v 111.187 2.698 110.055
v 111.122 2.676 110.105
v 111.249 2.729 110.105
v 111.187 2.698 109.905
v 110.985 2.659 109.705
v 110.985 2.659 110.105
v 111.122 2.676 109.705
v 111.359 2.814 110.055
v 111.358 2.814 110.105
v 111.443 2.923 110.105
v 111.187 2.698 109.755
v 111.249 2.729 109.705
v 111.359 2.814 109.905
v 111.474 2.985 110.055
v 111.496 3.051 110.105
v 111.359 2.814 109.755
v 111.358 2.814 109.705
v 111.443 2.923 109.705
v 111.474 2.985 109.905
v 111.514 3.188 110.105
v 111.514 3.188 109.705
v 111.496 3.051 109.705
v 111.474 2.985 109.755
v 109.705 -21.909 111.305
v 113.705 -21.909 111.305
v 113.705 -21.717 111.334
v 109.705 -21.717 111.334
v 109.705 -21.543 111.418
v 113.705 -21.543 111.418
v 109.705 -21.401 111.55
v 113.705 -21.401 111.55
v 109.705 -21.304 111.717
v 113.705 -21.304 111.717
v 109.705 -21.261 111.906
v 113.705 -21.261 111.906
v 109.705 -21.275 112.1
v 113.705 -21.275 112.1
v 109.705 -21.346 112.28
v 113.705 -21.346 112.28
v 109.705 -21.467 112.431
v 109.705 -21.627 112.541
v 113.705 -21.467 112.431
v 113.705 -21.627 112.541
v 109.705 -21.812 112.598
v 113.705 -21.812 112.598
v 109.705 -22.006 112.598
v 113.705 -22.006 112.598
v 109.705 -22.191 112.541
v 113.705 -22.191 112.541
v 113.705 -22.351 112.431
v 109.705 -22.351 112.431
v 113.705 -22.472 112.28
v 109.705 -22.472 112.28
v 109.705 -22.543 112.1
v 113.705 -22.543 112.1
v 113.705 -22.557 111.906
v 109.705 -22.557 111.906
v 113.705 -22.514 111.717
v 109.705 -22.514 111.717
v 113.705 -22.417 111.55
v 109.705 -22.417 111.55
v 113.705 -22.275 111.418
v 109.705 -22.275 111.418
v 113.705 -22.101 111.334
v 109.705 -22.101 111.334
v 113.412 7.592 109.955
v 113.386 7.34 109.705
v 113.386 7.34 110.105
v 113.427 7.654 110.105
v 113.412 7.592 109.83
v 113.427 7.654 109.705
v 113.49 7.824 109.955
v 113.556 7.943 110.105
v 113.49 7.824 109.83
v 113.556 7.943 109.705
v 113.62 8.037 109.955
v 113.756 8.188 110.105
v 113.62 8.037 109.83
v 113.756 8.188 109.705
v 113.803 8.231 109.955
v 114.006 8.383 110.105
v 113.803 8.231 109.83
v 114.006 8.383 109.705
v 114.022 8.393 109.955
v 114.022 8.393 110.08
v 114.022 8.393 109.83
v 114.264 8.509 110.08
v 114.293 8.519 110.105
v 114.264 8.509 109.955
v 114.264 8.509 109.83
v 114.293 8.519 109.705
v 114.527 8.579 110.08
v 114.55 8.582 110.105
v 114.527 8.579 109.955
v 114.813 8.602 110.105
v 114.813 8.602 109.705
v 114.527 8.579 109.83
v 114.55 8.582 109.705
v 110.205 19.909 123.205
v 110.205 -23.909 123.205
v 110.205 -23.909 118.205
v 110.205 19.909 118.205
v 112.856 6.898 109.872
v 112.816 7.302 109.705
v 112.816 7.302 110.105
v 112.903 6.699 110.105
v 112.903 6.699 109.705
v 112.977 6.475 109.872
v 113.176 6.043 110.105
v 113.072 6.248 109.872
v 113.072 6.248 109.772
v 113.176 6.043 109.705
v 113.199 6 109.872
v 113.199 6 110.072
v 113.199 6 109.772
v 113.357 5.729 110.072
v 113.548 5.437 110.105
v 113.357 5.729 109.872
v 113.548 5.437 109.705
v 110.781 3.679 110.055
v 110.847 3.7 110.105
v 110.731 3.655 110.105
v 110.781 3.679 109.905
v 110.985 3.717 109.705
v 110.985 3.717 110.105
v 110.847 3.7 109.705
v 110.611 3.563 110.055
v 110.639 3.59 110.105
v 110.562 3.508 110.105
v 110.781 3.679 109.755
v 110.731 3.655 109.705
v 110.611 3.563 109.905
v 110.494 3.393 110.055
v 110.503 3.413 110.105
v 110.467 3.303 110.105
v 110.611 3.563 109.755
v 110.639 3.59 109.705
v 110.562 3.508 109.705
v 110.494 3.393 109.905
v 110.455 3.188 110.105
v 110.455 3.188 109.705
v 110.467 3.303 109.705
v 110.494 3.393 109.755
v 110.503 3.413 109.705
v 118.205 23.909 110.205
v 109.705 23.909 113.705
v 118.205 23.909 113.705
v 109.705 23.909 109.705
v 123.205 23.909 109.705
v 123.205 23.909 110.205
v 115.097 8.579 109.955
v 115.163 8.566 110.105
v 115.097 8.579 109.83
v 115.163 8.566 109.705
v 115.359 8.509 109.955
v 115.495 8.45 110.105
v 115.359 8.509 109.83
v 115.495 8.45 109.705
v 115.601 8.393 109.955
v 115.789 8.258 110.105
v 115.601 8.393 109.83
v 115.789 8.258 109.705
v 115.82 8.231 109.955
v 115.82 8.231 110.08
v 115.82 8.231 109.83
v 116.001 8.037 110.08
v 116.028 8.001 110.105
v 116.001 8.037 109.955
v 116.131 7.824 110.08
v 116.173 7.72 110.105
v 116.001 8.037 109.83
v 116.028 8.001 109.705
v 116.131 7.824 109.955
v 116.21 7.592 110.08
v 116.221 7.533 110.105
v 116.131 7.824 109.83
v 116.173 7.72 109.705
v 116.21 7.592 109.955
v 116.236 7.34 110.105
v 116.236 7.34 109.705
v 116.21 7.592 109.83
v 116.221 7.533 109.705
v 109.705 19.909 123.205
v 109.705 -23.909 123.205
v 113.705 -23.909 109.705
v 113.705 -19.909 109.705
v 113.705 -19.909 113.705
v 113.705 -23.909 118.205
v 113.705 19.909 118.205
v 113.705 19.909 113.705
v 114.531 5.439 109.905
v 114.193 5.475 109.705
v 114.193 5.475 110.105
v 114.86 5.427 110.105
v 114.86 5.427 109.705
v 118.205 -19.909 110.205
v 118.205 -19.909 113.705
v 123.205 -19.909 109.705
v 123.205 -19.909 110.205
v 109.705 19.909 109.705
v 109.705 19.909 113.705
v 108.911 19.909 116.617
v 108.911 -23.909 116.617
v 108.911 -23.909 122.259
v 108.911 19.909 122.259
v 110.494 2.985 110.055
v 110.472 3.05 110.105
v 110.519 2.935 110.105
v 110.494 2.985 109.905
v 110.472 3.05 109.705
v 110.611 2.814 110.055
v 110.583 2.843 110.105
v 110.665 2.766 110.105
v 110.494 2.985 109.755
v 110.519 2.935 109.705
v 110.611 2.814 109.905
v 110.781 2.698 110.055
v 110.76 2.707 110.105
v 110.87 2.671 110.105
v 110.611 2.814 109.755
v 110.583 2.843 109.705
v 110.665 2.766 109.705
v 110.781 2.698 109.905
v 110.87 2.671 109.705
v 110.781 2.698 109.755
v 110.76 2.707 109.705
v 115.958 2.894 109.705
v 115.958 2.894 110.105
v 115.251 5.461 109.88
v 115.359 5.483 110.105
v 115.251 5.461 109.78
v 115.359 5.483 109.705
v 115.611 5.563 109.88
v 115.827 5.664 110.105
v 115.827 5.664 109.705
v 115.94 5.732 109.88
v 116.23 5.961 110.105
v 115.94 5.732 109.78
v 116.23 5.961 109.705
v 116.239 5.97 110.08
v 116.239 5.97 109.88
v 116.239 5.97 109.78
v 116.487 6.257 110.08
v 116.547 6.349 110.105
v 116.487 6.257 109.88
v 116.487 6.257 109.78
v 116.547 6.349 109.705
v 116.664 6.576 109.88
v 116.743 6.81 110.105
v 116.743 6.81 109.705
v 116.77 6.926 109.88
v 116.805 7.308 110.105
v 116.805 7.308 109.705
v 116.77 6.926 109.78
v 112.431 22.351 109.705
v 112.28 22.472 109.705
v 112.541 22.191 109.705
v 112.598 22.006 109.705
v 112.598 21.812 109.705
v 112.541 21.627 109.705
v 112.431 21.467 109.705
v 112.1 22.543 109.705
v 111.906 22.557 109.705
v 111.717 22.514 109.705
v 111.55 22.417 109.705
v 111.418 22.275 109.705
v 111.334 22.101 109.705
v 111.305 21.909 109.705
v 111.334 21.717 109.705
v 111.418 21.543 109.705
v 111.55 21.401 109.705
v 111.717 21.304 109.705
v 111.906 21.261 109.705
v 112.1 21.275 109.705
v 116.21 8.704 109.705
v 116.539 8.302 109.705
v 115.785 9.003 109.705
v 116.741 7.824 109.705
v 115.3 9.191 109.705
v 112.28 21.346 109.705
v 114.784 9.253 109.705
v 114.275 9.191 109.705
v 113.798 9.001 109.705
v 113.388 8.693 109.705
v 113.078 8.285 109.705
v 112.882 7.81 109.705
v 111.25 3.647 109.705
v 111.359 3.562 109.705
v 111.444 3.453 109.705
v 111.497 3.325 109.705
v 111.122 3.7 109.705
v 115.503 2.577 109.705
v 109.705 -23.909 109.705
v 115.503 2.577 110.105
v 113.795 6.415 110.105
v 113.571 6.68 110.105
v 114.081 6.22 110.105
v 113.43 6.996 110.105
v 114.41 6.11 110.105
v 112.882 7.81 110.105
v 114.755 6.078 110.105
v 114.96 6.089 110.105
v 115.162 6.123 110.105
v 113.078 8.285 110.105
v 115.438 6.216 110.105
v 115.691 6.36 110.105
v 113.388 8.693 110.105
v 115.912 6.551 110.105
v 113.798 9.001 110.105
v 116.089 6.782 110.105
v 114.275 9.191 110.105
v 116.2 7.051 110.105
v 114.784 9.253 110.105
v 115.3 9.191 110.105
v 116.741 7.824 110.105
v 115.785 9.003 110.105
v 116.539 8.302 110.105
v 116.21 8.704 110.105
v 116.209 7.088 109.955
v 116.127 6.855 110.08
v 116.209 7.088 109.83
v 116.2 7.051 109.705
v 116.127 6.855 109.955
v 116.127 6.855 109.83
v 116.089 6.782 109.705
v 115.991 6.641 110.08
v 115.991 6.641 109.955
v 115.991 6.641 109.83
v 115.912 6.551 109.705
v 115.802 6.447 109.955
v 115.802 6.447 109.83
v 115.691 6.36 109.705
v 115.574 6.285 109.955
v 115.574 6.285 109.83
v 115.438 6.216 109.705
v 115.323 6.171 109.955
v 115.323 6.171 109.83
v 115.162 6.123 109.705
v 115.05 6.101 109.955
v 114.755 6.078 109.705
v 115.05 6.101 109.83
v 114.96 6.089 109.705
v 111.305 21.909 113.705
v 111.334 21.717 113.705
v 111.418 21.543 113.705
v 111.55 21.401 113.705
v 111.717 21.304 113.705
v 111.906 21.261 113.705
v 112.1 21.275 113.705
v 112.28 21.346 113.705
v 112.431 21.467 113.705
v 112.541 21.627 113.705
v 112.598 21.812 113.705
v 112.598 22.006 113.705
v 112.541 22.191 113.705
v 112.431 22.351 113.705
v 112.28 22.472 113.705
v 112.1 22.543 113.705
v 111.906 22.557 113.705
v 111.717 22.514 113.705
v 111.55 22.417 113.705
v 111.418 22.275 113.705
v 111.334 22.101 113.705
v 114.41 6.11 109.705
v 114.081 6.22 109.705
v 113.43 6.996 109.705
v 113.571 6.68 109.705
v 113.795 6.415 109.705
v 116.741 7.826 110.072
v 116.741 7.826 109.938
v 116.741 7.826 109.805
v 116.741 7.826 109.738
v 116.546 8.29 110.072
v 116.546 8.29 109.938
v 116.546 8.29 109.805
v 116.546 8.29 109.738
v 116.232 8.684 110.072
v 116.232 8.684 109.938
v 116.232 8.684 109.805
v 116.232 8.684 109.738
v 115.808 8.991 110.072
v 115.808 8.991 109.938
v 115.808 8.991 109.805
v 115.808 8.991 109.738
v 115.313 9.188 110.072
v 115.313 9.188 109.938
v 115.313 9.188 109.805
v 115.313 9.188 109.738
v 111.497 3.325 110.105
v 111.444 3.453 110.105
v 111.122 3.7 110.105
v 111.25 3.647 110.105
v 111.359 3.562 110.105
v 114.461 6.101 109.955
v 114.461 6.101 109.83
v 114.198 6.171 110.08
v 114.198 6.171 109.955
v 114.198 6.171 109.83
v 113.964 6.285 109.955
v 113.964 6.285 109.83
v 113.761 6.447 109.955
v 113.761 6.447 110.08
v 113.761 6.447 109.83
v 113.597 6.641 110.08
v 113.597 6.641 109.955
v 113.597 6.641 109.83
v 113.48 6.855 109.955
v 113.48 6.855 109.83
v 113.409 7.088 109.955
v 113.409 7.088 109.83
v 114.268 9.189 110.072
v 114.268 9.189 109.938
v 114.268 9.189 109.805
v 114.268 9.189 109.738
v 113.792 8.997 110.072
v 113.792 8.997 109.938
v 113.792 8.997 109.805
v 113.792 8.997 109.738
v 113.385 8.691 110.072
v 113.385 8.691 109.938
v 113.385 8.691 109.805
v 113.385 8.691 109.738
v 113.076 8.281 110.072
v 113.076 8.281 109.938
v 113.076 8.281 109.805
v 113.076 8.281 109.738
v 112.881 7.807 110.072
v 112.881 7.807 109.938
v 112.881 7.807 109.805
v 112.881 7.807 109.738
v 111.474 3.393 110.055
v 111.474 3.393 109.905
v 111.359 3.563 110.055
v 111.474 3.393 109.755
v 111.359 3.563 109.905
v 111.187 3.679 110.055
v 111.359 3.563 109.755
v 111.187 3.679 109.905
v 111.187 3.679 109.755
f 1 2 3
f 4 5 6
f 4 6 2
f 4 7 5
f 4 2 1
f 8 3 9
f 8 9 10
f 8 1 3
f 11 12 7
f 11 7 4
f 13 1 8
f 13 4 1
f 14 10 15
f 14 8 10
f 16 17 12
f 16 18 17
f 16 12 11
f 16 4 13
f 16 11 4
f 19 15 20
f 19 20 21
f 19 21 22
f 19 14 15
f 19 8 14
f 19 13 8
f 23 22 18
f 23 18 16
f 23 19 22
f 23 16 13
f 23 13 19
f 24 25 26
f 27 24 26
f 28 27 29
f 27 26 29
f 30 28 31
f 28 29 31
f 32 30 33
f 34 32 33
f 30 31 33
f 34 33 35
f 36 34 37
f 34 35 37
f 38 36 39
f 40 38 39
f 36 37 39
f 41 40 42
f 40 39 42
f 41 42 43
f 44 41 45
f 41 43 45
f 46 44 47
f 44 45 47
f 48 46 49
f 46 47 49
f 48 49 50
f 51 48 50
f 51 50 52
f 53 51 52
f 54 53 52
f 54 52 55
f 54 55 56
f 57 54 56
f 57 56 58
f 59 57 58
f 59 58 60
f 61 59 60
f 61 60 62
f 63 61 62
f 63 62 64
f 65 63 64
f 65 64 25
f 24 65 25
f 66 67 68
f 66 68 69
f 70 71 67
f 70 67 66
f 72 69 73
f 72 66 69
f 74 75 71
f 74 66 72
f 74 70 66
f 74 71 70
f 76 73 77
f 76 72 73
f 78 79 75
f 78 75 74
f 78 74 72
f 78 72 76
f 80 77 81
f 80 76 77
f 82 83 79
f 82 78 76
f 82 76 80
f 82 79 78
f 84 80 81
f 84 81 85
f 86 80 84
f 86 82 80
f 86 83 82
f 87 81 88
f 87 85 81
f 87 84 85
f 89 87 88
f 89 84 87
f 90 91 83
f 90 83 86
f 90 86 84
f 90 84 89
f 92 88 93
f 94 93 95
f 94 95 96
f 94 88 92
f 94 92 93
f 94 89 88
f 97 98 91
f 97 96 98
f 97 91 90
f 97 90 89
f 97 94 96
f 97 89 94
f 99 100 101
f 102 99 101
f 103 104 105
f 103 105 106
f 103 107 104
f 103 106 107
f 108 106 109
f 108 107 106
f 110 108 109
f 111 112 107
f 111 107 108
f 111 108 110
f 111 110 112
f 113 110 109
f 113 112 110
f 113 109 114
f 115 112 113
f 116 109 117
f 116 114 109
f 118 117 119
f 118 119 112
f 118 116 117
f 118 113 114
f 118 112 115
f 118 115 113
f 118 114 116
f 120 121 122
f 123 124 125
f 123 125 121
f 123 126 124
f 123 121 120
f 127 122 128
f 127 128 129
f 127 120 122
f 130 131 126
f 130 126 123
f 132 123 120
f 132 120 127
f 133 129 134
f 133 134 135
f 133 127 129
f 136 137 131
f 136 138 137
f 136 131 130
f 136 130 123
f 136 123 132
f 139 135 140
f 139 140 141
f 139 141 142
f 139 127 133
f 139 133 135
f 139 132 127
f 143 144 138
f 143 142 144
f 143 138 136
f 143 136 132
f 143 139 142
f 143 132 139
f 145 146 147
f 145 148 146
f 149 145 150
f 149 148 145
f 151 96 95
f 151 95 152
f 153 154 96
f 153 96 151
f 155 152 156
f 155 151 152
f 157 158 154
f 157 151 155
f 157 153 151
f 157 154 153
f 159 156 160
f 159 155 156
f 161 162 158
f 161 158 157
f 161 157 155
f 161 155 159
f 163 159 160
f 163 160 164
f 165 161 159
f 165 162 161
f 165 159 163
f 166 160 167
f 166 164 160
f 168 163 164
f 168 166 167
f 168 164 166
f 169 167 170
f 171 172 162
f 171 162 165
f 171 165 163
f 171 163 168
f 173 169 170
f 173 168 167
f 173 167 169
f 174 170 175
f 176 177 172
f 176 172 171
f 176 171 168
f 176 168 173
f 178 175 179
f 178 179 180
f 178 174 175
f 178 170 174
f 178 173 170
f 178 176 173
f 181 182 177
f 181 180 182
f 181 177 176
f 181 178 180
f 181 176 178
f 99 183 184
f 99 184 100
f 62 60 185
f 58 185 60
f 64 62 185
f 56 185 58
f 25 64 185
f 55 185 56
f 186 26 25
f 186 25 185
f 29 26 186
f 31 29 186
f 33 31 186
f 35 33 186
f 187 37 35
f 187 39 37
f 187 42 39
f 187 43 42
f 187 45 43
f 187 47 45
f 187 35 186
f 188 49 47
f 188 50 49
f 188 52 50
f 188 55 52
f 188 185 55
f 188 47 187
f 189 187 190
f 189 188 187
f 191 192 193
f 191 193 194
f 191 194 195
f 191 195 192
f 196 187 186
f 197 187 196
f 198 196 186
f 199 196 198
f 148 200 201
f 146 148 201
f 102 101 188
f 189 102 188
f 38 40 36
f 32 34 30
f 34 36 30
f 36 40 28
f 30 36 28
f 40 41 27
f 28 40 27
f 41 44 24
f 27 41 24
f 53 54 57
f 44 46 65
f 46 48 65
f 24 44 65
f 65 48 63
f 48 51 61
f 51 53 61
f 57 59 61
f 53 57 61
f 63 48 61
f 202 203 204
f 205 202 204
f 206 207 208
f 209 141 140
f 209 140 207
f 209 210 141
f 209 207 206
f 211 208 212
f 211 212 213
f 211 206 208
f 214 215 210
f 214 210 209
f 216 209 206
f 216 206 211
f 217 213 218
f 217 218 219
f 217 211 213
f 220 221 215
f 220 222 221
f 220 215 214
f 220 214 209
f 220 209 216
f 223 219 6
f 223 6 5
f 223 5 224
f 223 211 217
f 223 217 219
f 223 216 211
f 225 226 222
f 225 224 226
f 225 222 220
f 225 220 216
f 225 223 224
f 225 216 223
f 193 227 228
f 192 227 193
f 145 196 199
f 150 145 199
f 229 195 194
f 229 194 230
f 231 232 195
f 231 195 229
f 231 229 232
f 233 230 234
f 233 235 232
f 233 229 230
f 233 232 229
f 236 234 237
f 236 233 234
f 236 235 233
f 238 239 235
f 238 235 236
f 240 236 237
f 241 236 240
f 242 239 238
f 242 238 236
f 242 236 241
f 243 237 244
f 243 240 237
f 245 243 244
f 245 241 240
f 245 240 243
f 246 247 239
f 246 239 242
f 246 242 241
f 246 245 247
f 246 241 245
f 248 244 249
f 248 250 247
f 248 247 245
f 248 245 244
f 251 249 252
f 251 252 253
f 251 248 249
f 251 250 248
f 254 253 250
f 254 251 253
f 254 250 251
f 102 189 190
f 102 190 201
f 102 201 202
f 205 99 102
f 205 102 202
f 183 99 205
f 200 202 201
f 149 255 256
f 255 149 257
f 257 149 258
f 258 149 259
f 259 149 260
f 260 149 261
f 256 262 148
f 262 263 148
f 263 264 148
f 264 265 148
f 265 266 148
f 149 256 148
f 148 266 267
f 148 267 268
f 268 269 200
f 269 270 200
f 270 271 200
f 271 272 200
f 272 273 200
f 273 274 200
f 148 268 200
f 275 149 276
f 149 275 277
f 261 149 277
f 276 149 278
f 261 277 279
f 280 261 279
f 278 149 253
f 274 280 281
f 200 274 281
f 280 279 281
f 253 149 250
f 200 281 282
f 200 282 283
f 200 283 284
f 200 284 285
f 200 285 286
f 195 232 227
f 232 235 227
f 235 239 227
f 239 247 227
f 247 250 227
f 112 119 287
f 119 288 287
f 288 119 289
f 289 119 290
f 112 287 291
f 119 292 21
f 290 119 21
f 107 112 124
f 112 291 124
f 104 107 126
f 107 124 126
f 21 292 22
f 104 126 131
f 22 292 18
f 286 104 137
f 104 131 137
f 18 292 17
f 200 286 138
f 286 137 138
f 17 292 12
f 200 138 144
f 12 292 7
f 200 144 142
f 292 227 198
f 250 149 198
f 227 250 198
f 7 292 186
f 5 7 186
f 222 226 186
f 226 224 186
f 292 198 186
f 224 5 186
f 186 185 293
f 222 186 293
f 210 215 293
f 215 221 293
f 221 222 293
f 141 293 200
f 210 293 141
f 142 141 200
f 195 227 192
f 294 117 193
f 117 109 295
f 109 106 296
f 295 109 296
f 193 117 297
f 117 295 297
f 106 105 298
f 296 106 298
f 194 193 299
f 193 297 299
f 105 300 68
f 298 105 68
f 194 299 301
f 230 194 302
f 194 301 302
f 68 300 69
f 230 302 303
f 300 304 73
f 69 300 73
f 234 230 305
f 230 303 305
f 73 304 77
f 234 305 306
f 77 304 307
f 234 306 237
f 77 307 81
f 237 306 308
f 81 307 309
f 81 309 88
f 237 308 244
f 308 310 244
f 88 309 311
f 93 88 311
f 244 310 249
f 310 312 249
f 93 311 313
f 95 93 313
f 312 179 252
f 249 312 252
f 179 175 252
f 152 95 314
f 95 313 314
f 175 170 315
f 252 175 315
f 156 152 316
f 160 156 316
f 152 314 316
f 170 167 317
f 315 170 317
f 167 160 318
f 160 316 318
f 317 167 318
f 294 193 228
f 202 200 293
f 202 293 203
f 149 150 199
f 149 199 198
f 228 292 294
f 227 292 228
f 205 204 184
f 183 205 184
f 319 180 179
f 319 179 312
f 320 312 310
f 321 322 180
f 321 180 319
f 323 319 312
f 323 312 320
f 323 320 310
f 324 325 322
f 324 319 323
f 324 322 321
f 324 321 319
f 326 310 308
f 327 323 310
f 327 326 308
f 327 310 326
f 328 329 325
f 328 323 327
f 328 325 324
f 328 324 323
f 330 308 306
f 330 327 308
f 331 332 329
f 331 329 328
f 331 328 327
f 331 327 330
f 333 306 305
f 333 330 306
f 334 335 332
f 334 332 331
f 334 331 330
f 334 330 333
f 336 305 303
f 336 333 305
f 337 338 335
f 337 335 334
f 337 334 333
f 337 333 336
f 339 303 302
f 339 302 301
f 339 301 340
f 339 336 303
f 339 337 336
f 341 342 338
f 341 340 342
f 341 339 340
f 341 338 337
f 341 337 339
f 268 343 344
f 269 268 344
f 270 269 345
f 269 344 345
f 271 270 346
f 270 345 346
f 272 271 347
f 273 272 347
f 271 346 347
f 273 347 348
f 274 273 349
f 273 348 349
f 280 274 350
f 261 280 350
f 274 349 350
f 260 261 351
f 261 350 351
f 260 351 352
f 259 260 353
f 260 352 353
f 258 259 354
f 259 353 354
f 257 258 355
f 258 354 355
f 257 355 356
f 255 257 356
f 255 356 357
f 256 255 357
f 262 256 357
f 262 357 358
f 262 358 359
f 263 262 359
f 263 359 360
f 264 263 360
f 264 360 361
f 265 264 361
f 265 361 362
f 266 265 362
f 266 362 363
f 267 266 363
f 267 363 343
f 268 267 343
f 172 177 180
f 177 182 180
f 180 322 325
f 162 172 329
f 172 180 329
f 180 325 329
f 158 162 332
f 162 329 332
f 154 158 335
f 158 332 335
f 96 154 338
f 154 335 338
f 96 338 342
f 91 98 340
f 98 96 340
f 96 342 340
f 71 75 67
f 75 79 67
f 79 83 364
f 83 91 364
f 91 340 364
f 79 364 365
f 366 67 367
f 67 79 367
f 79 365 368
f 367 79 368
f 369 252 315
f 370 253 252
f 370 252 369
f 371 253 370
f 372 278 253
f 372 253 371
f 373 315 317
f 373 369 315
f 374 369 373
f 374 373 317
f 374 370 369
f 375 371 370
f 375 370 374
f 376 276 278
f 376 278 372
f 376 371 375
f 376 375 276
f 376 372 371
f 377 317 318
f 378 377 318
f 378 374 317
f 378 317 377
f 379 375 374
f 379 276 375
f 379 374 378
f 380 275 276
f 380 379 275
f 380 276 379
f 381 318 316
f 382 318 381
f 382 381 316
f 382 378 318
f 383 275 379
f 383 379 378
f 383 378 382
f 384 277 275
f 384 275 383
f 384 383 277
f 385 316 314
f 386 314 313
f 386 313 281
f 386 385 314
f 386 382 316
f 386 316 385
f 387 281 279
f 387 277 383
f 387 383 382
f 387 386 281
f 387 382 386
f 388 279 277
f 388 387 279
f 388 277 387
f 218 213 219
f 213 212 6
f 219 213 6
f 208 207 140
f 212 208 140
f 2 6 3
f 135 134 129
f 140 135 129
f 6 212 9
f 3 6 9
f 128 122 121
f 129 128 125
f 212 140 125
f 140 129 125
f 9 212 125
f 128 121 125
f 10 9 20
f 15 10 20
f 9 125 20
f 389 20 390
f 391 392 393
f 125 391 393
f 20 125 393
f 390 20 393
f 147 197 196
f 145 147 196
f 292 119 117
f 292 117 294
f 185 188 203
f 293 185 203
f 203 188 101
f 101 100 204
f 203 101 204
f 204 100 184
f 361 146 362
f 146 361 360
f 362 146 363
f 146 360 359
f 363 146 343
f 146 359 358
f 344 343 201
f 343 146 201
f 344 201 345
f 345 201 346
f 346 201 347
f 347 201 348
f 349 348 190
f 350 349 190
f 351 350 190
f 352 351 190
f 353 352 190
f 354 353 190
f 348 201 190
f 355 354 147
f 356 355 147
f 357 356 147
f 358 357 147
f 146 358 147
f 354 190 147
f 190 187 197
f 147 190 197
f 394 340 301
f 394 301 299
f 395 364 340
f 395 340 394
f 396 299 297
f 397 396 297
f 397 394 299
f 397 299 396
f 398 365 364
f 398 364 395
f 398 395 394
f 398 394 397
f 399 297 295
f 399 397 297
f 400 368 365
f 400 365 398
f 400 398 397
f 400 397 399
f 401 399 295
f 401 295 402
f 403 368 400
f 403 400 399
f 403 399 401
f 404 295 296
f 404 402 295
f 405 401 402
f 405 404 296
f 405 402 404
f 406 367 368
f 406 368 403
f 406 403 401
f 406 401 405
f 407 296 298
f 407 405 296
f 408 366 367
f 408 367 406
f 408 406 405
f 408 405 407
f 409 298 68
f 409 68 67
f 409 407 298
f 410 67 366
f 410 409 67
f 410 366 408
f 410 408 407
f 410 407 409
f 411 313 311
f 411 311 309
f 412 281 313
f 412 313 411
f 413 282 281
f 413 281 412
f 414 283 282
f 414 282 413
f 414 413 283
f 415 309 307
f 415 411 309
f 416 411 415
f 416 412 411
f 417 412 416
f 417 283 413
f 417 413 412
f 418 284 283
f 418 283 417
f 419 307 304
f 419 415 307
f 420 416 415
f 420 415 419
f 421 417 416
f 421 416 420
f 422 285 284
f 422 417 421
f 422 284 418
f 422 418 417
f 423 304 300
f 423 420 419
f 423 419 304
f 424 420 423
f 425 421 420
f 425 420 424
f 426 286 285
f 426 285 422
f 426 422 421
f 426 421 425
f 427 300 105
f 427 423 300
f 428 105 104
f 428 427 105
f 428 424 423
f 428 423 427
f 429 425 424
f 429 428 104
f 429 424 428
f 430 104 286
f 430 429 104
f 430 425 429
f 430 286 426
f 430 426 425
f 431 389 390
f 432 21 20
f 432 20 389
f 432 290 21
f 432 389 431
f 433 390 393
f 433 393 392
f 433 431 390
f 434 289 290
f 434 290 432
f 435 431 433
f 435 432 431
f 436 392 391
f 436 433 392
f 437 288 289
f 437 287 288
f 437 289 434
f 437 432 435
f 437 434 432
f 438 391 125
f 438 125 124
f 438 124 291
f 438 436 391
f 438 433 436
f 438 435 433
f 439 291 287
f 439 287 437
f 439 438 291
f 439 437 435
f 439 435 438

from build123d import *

# Parameters (mm, degrees)
STOCK_GOUX_START         = -23.909074226
STOCK_GOUX_LIKED_1_DEPTH = 47.818148452
SKETCH2_W                = 9.499999796
SKETCH2_H                = 4
CUT_EXTRUDE1_DEPTH       = 126.862368241
SKETCH4_R                = 0.64999997
CUT_EXTRUDE2_DEPTH       = 126.862368241
CIRPATTERN1_COUNT        = 2
CUT_EXTRUDE3_DEPTH       = 0.4
BOSS_EXTRUDE1_DEPTH      = 43.818148451


# Read off the part's stored shape, not the designer's step: Stock-Goux Liked-1
with BuildPart() as part:
    # Stock-Goux Liked-1 outline → Stock-Goux Liked-1 (new body)
    with BuildSketch(Plane(origin=(0, 0, 0), x_dir=(1, 0, 0), z_dir=(0, 1, 0)).offset(STOCK_GOUX_START)):
        Polygon((118.20487789, -113.704878), (118.20487789, -110.204877888), (123.204877796, -110.204877888), (123.204877796, -109.704877872), (109.704877872, -109.704877872), (109.704877872, -123.204877796), (110.204877888, -123.204877796), (110.204877888, -118.20487789), (113.704878, -118.20487789), (113.704878, -113.704878), align=None)
    extrude(amount=STOCK_GOUX_LIKED_1_DEPTH)

    # Sketch2 → Cut-Extrude1 (cut, through all)
    with BuildSketch(Plane.XY.offset(113.704878)):
        with Locations((118.454877898, -21.909074226)):
            Rectangle(SKETCH2_W, SKETCH2_H)
    cut_extrude1 = extrude(amount=-CUT_EXTRUDE1_DEPTH, mode=Mode.SUBTRACT)

    # Sketch4 → Cut-Extrude2 (cut, through all)
    with BuildSketch(Plane(origin=(113.704878, 0, 0), x_dir=(0, 0, -1), z_dir=(1, 0, 0))):
        with Locations((-111.954877944, -21.909074226)):
            Circle(SKETCH4_R)
    cut_extrude2 = extrude(amount=-CUT_EXTRUDE2_DEPTH, mode=Mode.SUBTRACT)

    # CirPattern1: Cut-Extrude1, Cut-Extrude2 ×2 about axis
    cirpattern1_axis = Axis((109.279877871, 0, 109.279877871), (0.7071067811865481, 0, 0.707106781186547))
    add([cut_extrude1.rotate(cirpattern1_axis, i * 360 / CIRPATTERN1_COUNT) for i in range(1, CIRPATTERN1_COUNT)], mode=Mode.SUBTRACT)
    add([cut_extrude2.rotate(cirpattern1_axis, i * 360 / CIRPATTERN1_COUNT) for i in range(1, CIRPATTERN1_COUNT)], mode=Mode.SUBTRACT)

    # Sketch5 → Cut-Extrude3 (cut)
    # profile 1 of 2: a face of its own
    with BuildSketch(Plane(origin=(0, 0, 109.704877872), x_dir=(-1, 0, 0), z_dir=(0, 0, -1))):
        with BuildLine():
            Line((-115.502816358, 2.577164082), (-115.958204979, 2.893900861))
            Line((-115.958204979, 2.893900861), (-114.192620044, 5.474860396))
            add(Edge.make_bspline(
                [(-114.192620044, 5.474860396), (-114.305270378, 5.46108441), (-114.527085168, 5.433958724), (-114.750491053, 5.428975508), (-114.860438553, 5.426523056)],
                knots=[0, 0, 0, 0, 1.015715272, 2, 2, 2, 2], degree=3))
            add(Edge.make_bspline(
                [(-114.860438553, 5.426523056), (-114.927099126, 5.428230438), (-115.057948, 5.431581878), (-115.250319712, 5.458146302), (-115.435169229, 5.499058677), (-115.61200649, 5.560107132), (-115.781496163, 5.635977312), (-115.943268243, 5.730060751), (-116.097104958, 5.840743594), (-116.241354116, 5.967440593), (-116.372548271, 6.106556488), (-116.48943054, 6.253796012), (-116.586569451, 6.410869558), (-116.667262684, 6.574572957), (-116.728459364, 6.747259122), (-116.773022825, 6.926963034), (-116.800459097, 7.114944155), (-116.80372317, 7.242896893), (-116.80538046, 7.3078632)],
                knots=[0, 0, 0, 0, 1.060718605, 2.082097864, 3.085795603, 4.069760067, 5.054557537, 6.03741023, 7.043284206, 8.066802108, 9.088538119, 10.083643548, 11.053783639, 12.022749082, 12.983451788, 13.964007469, 14.966251758, 16, 16, 16, 16], degree=3))
            add(Edge.make_bspline(
                [(-116.80538046, 7.3078632), (-116.8022337, 7.396706327), (-116.796057248, 7.571087363), (-116.746348509, 7.825874344), (-116.66459618, 8.066787073), (-116.550607553, 8.293192139), (-116.407034559, 8.501832709), (-116.234480402, 8.689808329), (-116.033994639, 8.854445421), (-115.810144404, 8.995967104), (-115.568203923, 9.109786313), (-115.314805072, 9.193677615), (-115.051889454, 9.243023915), (-114.873785253, 9.249529692), (-114.784116438, 9.252805107)],
                knots=[0, 0, 0, 0, 1.022988612, 2.007919123, 2.978103895, 3.94594894, 4.918897164, 5.887013414, 6.875921846, 7.89917871, 8.930658928, 9.948724884, 10.967259574, 12, 12, 12, 12], degree=3))
            add(Edge.make_bspline(
                [(-114.784116438, 9.252805107), (-114.696144591, 9.249484669), (-114.522320513, 9.242923795), (-114.266707601, 9.194874308), (-114.021886042, 9.11389063), (-113.789212994, 9.001977207), (-113.573785775, 8.861694989), (-113.380063946, 8.694536639), (-113.212468325, 8.50039804), (-113.07127357, 8.283974636), (-112.957935069, 8.051443113), (-112.876161069, 7.808720854), (-112.825822553, 7.557553459), (-112.819479217, 7.387383485), (-112.816277896, 7.301503024)],
                knots=[0, 0, 0, 0, 1.026385292, 2.028040595, 3.023318987, 4.028184125, 5.03290303, 6.015178782, 7.004435299, 8.016004309, 9.023023918, 10.015172535, 10.998308025, 12, 12, 12, 12], degree=3))
            add(Edge.make_bspline(
                [(-112.816277896, 7.301503024), (-112.818415867, 7.234839332), (-112.822752205, 7.099628708), (-112.853116648, 6.894196515), (-112.904678984, 6.684734999), (-112.96319278, 6.507440104), (-113.019675427, 6.361011916), (-113.072836052, 6.245348335), (-113.131822387, 6.123607472), (-113.200617862, 5.997065873), (-113.274572315, 5.864110417), (-113.358137002, 5.726074632), (-113.449405682, 5.582773288), (-113.514411031, 5.486167857), (-113.547698169, 5.436699338)],
                knots=[0, 0, 0, 0, 1.179839688, 2.393009684, 3.667231171, 4.993948276, 5.694988576, 6.444077775, 7.246288328, 8.089075292, 8.993003841, 9.939041771, 10.944649915, 12, 12, 12, 12], degree=3))
            Line((-113.547698169, 5.436699338), (-115.502816358, 2.577164082))
        make_face()
        with BuildLine():
            add(Edge.make_bspline(
                [(-114.754859627, 6.077805107), (-114.704360773, 6.079184661), (-114.606056671, 6.081870182), (-114.462043571, 6.098215521), (-114.32610966, 6.127196896), (-114.197891822, 6.168779802), (-114.076104442, 6.218956901), (-113.962681961, 6.282841505), (-113.857529453, 6.359071685), (-113.759942786, 6.444724142), (-113.673285243, 6.539884487), (-113.59610003, 6.639483523), (-113.530494429, 6.743958458), (-113.478672484, 6.854617663), (-113.436064754, 6.968767455), (-113.406640647, 7.088246071), (-113.390340499, 7.212431027), (-113.387561785, 7.296792878), (-113.386149691, 7.339664082)],
                knots=[0, 0, 0, 0, 1.163407946, 2.26475976, 3.333800367, 4.359385343, 5.366239384, 6.363380779, 7.350133999, 8.353570782, 9.349036268, 10.310270964, 11.253520213, 12.184142, 13.120487599, 14.056272588, 15.012232024, 16, 16, 16, 16], degree=3))
            add(Edge.make_bspline(
                [(-113.386149691, 7.339664082), (-113.387364662, 7.382553189), (-113.389758912, 7.467071435), (-113.408967299, 7.591440248), (-113.442758775, 7.710626593), (-113.488098654, 7.825282973), (-113.547825371, 7.934467362), (-113.619495981, 8.039550558), (-113.704644854, 8.139866276), (-113.802620939, 8.233055217), (-113.908275056, 8.318957834), (-114.020870535, 8.394769715), (-114.139479312, 8.458308171), (-114.263377772, 8.510739159), (-114.392824062, 8.551654524), (-114.527741583, 8.581077457), (-114.668812105, 8.597354783), (-114.764572438, 8.600115935), (-114.813373249, 8.601523056)],
                knots=[0, 0, 0, 0, 0.972161553, 1.915763587, 2.844109794, 3.775983486, 4.705125789, 5.659731448, 6.655561913, 7.682237399, 8.721216875, 9.739758359, 10.754845918, 11.767244016, 12.7857855, 13.828538656, 14.893392813, 16, 16, 16, 16], degree=3))
            add(Edge.make_bspline(
                [(-114.813373249, 8.601523056), (-114.861749641, 8.600113661), (-114.956663725, 8.597348441), (-115.096480128, 8.581108397), (-115.23048539, 8.551456647), (-115.359556615, 8.510758112), (-115.483451394, 8.45830426), (-115.602054576, 8.394766386), (-115.714676392, 8.318975285), (-115.820229214, 8.232987627), (-115.918378301, 8.14030004), (-116.00206319, 8.039111105), (-116.073897823, 7.934522025), (-116.133542471, 7.825268446), (-116.17890418, 7.71063047), (-116.212689812, 7.591439198), (-116.231899769, 7.467071708), (-116.234293803, 7.382553281), (-116.235508665, 7.339664082)],
                knots=[0, 0, 0, 0, 1.099389452, 2.15699305, 3.192601482, 4.213358962, 5.227959689, 6.245255729, 7.266013209, 8.307253147, 9.336162325, 10.327954924, 11.284637477, 12.215801273, 13.149702402, 14.080068371, 15.025723358, 16, 16, 16, 16], degree=3))
            add(Edge.make_bspline(
                [(-116.235508665, 7.339664082), (-116.234409342, 7.296759493), (-116.232241276, 7.21214379), (-116.211326572, 7.087817334), (-116.176350264, 6.968640183), (-116.129506512, 6.853453528), (-116.067817913, 6.743377443), (-115.992118932, 6.638933801), (-115.903390298, 6.538938627), (-115.802818114, 6.444945542), (-115.692748736, 6.35867231), (-115.575188925, 6.283324331), (-115.452162507, 6.219692896), (-115.323236405, 6.168636385), (-115.189366068, 6.127612367), (-115.04934833, 6.098268935), (-114.903646242, 6.082026965), (-114.804930989, 6.079225895), (-114.754859627, 6.077805107)],
                knots=[0, 0, 0, 0, 0.952633368, 1.87876736, 2.791047057, 3.707742249, 4.635551637, 5.587206343, 6.568248508, 7.601284464, 8.641511608, 9.671105535, 10.699146789, 11.713763218, 12.747829548, 13.806491675, 14.887386225, 16, 16, 16, 16], degree=3))
        make_face(mode=Mode.SUBTRACT)
    # profile 2 of 2: a face of its own
    with BuildSketch(Plane(origin=(0, 0, 109.704877872), x_dir=(-1, 0, 0), z_dir=(0, 0, -1))):
        with BuildLine():
            add(Edge.make_bspline(
                [(-110.984547127, 3.716907671), (-110.949186313, 3.714806426), (-110.879865572, 3.710687181), (-110.779646011, 3.682426644), (-110.688941414, 3.632245931), (-110.608147199, 3.565366319), (-110.541551163, 3.484275616), (-110.489582124, 3.394294467), (-110.461567765, 3.293235864), (-110.457478525, 3.223513453), (-110.45538046, 3.187741005)],
                knots=[0, 0, 0, 0, 1.020151414, 1.999887582, 2.974338812, 3.990962822, 5.007586832, 5.987933904, 6.967670073, 8, 8, 8, 8], degree=3))
            add(Edge.make_bspline(
                [(-110.45538046, 3.187741005), (-110.457549622, 3.152828107), (-110.461827176, 3.083980384), (-110.489517908, 2.983684016), (-110.541947227, 2.893646632), (-110.607687857, 2.81145561), (-110.688961387, 2.744434316), (-110.779860451, 2.694680534), (-110.879630305, 2.664396513), (-110.949147063, 2.660538803), (-110.984547127, 2.658574338)],
                knots=[0, 0, 0, 0, 1.009421747, 1.99056486, 2.972319754, 3.999869655, 5.017953583, 5.993804169, 6.978383603, 8, 8, 8, 8], degree=3))
            add(Edge.make_bspline(
                [(-110.984547127, 2.658574338), (-111.019972699, 2.660467722), (-111.089132694, 2.664164102), (-111.188530141, 2.695302336), (-111.279982784, 2.743967757), (-111.361240489, 2.811580579), (-111.427531716, 2.893223696), (-111.477652054, 2.984304098), (-111.507751324, 3.083693277), (-111.511709865, 3.152771558), (-111.513713794, 3.187741005)],
                knots=[0, 0, 0, 0, 1.022052826, 1.995314843, 2.982371812, 4.00089066, 5.028879526, 6.005146991, 6.990147033, 8, 8, 8, 8], degree=3))
            add(Edge.make_bspline(
                [(-111.513713794, 3.187741005), (-111.511786842, 3.223572022), (-111.508024706, 3.293527686), (-111.477588865, 3.393674638), (-111.427920595, 3.484694521), (-111.360782235, 3.565242602), (-111.280002441, 3.632710994), (-111.188750755, 3.681814262), (-111.088893303, 3.710916152), (-111.019932415, 3.714875861), (-110.984547127, 3.716907671)],
                knots=[0, 0, 0, 0, 1.032775665, 2.016367738, 2.991239715, 4.008302682, 5.025365648, 6.011011707, 6.979408107, 8, 8, 8, 8], degree=3))
        make_face()
    extrude(amount=-CUT_EXTRUDE3_DEPTH, mode=Mode.SUBTRACT)

    # Sketch6 → Boss-Extrude1 (add)
    with BuildSketch(Plane.XZ.offset(23.909074226)):
        Polygon((109.704877872, 109.704877872), (108.911127872, 116.61737789), (108.911127872, 122.258923382), (109.704877872, 123.204877796), align=None)
    extrude(amount=-BOSS_EXTRUDE1_DEPTH)


solid = part.part
